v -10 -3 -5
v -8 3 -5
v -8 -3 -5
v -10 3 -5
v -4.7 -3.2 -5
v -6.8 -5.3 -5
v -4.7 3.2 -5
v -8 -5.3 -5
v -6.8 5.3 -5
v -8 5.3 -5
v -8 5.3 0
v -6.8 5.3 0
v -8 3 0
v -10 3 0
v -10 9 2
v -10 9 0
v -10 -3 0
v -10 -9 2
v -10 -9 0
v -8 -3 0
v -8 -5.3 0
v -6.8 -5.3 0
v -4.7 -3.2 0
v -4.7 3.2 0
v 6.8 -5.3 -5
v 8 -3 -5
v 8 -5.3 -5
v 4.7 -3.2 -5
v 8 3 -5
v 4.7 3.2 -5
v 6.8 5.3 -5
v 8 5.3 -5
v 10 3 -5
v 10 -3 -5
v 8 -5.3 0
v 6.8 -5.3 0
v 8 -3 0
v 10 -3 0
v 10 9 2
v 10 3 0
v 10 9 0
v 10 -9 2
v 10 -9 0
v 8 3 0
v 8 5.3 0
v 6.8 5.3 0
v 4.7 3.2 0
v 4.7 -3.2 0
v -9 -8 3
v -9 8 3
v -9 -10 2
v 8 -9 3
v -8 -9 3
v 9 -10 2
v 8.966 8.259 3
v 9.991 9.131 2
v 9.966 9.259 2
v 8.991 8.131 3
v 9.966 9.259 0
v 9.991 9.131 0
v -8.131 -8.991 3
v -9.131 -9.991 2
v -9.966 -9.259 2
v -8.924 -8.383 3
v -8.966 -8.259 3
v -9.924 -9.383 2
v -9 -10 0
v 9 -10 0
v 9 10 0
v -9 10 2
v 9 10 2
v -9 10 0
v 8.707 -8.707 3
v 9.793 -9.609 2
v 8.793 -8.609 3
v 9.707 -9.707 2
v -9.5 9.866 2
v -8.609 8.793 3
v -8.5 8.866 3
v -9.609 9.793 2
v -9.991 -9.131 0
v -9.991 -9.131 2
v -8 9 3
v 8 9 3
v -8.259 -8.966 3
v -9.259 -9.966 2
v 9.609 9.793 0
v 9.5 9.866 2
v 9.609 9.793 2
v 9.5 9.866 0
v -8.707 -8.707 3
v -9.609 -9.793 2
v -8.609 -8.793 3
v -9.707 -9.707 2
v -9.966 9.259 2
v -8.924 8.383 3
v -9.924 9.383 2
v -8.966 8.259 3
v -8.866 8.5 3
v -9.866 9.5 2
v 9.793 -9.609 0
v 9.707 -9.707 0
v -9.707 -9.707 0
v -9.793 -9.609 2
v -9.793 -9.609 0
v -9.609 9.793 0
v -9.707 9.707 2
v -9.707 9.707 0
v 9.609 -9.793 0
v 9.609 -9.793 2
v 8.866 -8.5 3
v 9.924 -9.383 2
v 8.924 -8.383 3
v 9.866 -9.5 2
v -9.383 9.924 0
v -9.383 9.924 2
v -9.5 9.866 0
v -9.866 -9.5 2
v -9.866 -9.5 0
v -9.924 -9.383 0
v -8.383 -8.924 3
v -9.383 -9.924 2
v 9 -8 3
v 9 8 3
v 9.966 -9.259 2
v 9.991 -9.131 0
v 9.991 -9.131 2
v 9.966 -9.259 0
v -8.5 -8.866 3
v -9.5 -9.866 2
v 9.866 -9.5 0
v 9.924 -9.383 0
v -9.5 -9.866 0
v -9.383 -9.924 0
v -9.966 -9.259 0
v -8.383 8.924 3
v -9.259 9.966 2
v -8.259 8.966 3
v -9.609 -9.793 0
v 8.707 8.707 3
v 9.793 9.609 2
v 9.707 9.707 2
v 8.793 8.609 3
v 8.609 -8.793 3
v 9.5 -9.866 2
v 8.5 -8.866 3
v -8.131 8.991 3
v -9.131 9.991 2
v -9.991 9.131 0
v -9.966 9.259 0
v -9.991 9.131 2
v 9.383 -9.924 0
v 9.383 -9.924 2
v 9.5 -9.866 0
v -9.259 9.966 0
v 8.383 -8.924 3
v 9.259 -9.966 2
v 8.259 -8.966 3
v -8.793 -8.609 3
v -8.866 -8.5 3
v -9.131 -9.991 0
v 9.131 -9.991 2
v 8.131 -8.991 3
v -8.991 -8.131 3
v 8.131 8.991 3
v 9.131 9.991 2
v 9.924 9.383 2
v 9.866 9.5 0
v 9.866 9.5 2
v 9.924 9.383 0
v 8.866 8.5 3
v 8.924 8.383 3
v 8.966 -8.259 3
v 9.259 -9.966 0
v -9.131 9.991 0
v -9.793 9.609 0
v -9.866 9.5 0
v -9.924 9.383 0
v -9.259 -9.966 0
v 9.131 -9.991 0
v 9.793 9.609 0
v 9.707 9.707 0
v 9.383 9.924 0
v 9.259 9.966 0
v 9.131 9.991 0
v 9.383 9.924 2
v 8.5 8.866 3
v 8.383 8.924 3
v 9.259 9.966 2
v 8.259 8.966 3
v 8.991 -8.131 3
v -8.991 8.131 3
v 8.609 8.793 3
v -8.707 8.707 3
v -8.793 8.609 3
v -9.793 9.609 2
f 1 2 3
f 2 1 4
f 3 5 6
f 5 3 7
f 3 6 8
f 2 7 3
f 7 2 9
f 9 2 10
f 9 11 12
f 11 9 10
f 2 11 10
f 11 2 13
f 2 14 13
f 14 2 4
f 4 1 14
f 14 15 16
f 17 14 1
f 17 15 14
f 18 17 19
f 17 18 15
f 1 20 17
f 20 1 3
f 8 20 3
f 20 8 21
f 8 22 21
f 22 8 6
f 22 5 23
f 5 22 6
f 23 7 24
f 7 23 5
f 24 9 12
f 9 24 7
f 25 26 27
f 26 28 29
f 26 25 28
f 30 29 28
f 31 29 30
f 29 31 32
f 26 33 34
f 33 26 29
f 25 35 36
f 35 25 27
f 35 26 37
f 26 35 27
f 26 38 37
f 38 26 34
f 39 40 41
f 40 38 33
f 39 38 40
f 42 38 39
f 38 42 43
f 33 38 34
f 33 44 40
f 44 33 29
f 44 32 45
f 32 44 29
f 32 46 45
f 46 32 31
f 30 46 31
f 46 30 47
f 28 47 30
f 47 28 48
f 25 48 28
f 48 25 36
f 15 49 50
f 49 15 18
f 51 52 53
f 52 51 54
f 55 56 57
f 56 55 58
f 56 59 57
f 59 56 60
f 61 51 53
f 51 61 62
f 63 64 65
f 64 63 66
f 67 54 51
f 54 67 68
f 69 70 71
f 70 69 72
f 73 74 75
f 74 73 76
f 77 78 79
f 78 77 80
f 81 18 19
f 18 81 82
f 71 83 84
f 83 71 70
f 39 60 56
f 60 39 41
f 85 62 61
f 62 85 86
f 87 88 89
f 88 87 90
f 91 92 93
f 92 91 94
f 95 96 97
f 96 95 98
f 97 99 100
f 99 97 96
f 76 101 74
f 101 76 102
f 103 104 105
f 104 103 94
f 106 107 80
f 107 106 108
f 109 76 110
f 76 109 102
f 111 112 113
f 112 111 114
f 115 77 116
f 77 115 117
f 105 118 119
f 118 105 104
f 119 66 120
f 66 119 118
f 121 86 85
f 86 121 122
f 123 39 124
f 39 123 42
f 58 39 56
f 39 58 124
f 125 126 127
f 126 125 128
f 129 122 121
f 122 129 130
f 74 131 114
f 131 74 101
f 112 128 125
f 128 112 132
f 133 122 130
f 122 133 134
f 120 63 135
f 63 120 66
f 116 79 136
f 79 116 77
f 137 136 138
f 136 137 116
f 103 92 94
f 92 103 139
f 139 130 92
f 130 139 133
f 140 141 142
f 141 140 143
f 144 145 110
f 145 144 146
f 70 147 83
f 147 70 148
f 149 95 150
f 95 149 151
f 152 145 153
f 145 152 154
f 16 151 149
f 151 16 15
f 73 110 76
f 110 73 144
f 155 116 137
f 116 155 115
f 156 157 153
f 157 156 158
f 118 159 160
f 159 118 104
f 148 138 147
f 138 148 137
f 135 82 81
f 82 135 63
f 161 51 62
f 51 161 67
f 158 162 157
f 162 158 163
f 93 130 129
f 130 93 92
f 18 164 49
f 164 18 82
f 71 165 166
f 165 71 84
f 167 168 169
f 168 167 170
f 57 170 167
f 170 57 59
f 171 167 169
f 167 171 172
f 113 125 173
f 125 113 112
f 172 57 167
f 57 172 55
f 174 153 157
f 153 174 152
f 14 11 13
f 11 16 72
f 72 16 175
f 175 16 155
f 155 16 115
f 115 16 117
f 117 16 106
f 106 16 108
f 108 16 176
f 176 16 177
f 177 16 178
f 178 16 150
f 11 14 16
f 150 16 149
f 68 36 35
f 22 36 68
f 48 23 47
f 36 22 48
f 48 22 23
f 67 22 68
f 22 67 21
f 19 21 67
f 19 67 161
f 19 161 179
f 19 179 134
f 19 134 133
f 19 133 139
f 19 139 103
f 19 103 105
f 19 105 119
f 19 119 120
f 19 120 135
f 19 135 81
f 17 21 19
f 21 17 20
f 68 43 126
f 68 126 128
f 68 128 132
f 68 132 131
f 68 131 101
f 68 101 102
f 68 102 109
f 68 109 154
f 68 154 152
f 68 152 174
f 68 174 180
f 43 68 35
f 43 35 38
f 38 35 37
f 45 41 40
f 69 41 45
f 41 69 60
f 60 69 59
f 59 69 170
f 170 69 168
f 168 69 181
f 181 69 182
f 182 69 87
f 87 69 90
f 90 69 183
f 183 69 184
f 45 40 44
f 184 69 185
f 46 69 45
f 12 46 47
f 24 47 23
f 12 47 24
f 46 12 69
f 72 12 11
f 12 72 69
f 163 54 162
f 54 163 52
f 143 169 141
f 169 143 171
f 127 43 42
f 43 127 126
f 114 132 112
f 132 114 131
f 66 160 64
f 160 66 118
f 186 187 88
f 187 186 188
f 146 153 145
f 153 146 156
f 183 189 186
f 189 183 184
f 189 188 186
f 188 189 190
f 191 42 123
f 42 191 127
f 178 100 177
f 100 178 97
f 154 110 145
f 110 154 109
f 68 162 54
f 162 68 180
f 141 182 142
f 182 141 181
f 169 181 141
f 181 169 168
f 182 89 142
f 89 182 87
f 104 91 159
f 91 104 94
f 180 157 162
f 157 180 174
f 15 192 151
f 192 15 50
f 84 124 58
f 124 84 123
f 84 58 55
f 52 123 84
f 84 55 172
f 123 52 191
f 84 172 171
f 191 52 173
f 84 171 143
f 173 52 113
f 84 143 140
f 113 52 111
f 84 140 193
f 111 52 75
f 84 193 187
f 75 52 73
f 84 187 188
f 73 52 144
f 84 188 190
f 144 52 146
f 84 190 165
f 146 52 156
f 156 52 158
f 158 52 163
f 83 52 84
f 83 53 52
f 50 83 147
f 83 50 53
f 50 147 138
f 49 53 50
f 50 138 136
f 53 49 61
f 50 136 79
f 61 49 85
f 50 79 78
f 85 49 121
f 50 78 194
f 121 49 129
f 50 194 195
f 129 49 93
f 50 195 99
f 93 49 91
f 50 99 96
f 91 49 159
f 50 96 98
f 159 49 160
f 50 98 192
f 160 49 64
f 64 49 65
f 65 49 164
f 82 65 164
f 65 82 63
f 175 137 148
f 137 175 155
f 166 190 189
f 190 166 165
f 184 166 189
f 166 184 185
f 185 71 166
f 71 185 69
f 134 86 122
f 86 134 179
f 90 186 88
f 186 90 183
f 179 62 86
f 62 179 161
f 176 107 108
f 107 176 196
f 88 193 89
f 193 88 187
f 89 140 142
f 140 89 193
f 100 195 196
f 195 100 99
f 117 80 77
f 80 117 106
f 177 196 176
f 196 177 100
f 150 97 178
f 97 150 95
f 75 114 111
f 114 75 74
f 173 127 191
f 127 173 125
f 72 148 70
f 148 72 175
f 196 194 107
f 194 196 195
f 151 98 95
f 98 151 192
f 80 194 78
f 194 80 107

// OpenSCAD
// file: spine-cap.scad
// Spine cap, v3: a square 20 x 20 block that plugs into the top of the
// vertical 2020 and carries the balance line over it in a 45 degree V groove.
// The line comes up the spine's front slot from the carriage, crosses the top,
// and drops THROUGH the cap into the rear slot's channel, so it runs down
// inside the channel to the load stack's T slider (load-stack.scad). No
// guide line anchors any more: Matt tried guide lines on the rig, 2026-09-19,
// and gave them up for the rail's own channel.
//
// Press fit from the rail's own geometry: a tee tab into each SIDE slot,
// stem a touch wider than the slot opening, head a diamond under the lips
// with every face at 45 degrees or vertical. No centre peg. The front and
// rear slots are left open.
//
// Cut for plain T-slot 2020, not V-slot: a 6 mm straight opening, lips about
// 1.8 thick, an 11 mm channel. Measure the rail: slot_w is what the fit
// rides on, and generic extrusion runs 6.0 to 6.3.
//
// The top's front edge is chamfered 45 degrees and the V groove follows the
// chamfer down to the face, so the line bends twice by 45 on its way down to
// the carriage. At the rear the groove runs level to drop_y, where a thin slit
// goes down through the cap into the channel and out through the rear face,
// so the line is laid in with the cap on and sits at the slit's front end.
//
// Printed upside down (print_flip = true, which the STL is): the top face is
// on the bed, the V groove is a 45 degree cavity, the chamfer a 45 degree
// overhang, the tabs stand up. No support.
//
// Friction: a groove is a capstan and the line wraps 180 degrees. At 10 N
// hanging and mu ~0.15 on smooth PLA that is about 3.8 N to raise the arm
// and 6 N to lower it. Keep the groove smooth; a pulley is the fallback.
rail        = 20;
// Plain T-slot 2020. Measure yours.
slot_w      = 6.0;     // opening at the face
lip_t       = 1.8;     // face to the underside of the lip
chan_w      = 11;      // channel width just under the lips
chan_str    = 1.6;     // how far below the lips the channel stays full width, before it angles in at 45
chan_d      = 5.5;     // face to the deepest the tab may go
cap_h       = 5;       // above the rail's end
groove_w    = 3;       // at the surface; 45 degree walls, so 1.5 deep
edge_c      = 1.5;     // chamfer on the front top edge; the groove follows it, so at least groove_d
side_c      = 1.5;     // chamfer on the rear and side top edges, the same
tab_len     = 5;       // into the rail
tab_fit     = 0.0;     // a side, in the opening: 0.1 sheared on the first print, printed stems run fat anyway
tab_clr     = 0.2;     // a side, everywhere else
drop_y      = 8.0;     // the slit's front end: the line drops here into the channel, at load-stack.scad's line_y
drop_slit   = 1.2;     // a thin slit from there out through the rear face
print_flip  = false;   // top face down, tabs up
show_context = false;  // rail stub and the two line runs; preview only
$fn = 48;

half       = rail/2;
groove_d   = groove_w/2;
// Tab, distances from the rail centre: stem through the opening to just under
// the lip, then a head full width for the channel's straight part, then 45
// degrees in to the bottom: the shape of a 2020 channel. The first cut was a
// diamond widest 4 mm down, where the channel has already narrowed, and it
// sheared going in.
stem_h     = slot_w/2 + tab_fit;
stem_top   = half - lip_t - tab_clr;          // underside of the lip
head_h     = chan_w/2 - tab_clr;              // full width
head_y     = half - lip_t - chan_str + tab_clr;   // down to where the channel angles in
bottom_y   = half - chan_d + tab_clr;         // deepest point
bottom_h   = head_h - (head_y - bottom_y);    // half width there

assert(groove_d < cap_h - 1, "groove through the cap");
assert(edge_c >= groove_d, "chamfer shallower than the groove");
assert(bottom_h > 1.5, "tab bottom too narrow: raise chan_d or chan_str");
assert(head_y > bottom_y, "channel too shallow for the head");
echo(str("cap ", cap_h, " high; tab stem ", 2*stem_h, " wide, head ", 2*head_h,
         " wide from ", half - stem_top, " to ", half - head_y, " below the face, then 45 in to ",
         2*bottom_h, " wide at ", half - bottom_y));

module tab_2d() {   // for the +Y slot, y outward; rotated to the side slots
    polygon([
        [-stem_h, half], [-stem_h, stem_top], [-head_h, stem_top], [-head_h, head_y],
        [-bottom_h, bottom_y], [ bottom_h, bottom_y],
        [ head_h, head_y], [ head_h, stem_top], [ stem_h, stem_top], [ stem_h, half]
    ]);
}
module tabs() {
    for(a=[90, -90]) rotate([0,0,a]) translate([0,0,-tab_len]) linear_extrude(tab_len + 0.01) tab_2d();
}

// Body: YZ profile with the two chamfers, extruded across X.
module body_2d() {   // YZ: front chamfer edge_c, rear chamfer side_c
    polygon([[-half, 0], [half, 0], [half, cap_h - side_c], [half - side_c, cap_h],
             [-half + edge_c, cap_h], [-half, cap_h - edge_c]]);
}
module sides_2d() {  // XZ: side chamfers
    polygon([[-half, 0], [half, 0], [half, cap_h - side_c], [half - side_c, cap_h],
             [-half + side_c, cap_h], [-half, cap_h - side_c]]);
}
module yz(w) { rotate([90,0,90]) linear_extrude(w, center=true) children(); }

// V cutter cross-section: apex groove_d below the surface, flared above it.
module vee_2d() {
    polygon([[-groove_w/2 - 1, 1], [-groove_w/2, 0], [0, -groove_d], [groove_w/2, 0], [groove_w/2 + 1, 1]]);
}
// The V section at a point on the path, tilted about X by `tilt` so it stays
// square to the surface (0 on the top, -45 down the rear chamfer).
module vee_at(y, z, tilt) {
    translate([0, y, z]) rotate([tilt, 0, 0]) rotate([90,0,0]) linear_extrude(0.02, center=true) vee_2d();
}
module groove() {
    yt = half - edge_c;   // front chamfer starts
    e  = 1.5;             // run past the face
    hull() { vee_at(-yt, cap_h, 22.5); vee_at(half + e, cap_h, 0); }
    hull() { vee_at(-yt, cap_h, 22.5); vee_at(-half - e, cap_h - edge_c - e, 45); }
}

assert(drop_y + drop_slit/2 < half, "drop slit starts outside the rear face");
assert(groove_d >= side_c, "rear chamfer reaches down to the drop hole mouth");
module drop() {
    hull() for(y=[drop_y, half + 1]) translate([0, y, -1]) cylinder(h=cap_h + 2, d=drop_slit, $fn=16);
    // eased front end, where the line turns down out of the groove
    translate([0, drop_y, cap_h - groove_d - 1]) cylinder(h=1.01, d1=drop_slit, d2=drop_slit + 2, $fn=16);
}
module spine_cap() {
    difference() {
        union() {
            intersection() { yz(rail) body_2d(); rotate([90,0,0]) linear_extrude(rail + 2, center=true) sides_2d(); }
            tabs();
        }
        groove();
        drop();
    }
}

if(print_flip) translate([0,0,cap_h]) rotate([180,0,0]) spine_cap();
else spine_cap();

if(show_context && !print_flip) %union() {
    translate([0,0,-60]) color([0.66,0.71,0.75]) linear_extrude(60) difference() {
        square(rail, center=true);
        for(a=[0:90:270]) rotate(a) {
            translate([-slot_w/2, half - lip_t]) square([slot_w, lip_t + 1]);
            translate([-chan_w/2, half - chan_d]) square([chan_w, chan_d - lip_t]);
        }
    }
    color([0.1,0.7,0.9]) for(y=[-half, half])
        translate([0, y, -60]) cylinder(h=60 + cap_h - edge_c, d=0.6, $fn=8);
}
// main file
// Arm end cap: a plain 20 x 20 lid for each end of the gantry 2020 (Matt,
// 2026-09-27). It carries nothing; it covers the cut end and its edges.
//
// The press fit is the spine cap's, by `use`, unchanged: a tee tab into two
// opposite slots, stem at the slot opening, head under the lips
// (spine-cap.scad, tabs()). That fit is proven on this V-slot. The cap is
// square, so it goes on with the tabs in either pair of slots; the side
// slots keep them out of the wheels' tracks.
//
// It stays inside the rail's 20 x 20, so it is not a travel stop: the wheels
// roll straight past it and off the end.
//
// Printed upside down (print_flip = true, which the STL is): the top face on
// the bed, the chamfer a 45 degree overhang, the tabs standing. No support.
// Print two.
use <spine-cap.scad>
rail        = 20;
cap_h       = 3;       // above the rail's end
edge_c      = 1;       // chamfer on the four top edges
corner_r    = 1;       // the four upright corners
print_flip  = false;   // top face down, tabs up
show_context = false;  // rail stub; preview only
$fn = 48;

assert(edge_c < cap_h, "chamfer taller than the cap");
assert(edge_c < rail/2 - corner_r, "chamfer leaves no top face");
echo(str("end cap ", rail, " x ", rail, " x ", cap_h, ", tabs from spine-cap.scad"));

module plan(d=0) { offset(r=corner_r) square(rail - 2*corner_r - 2*d, center=true); }

module arm_end_cap() {
    hull() {
        linear_extrude(cap_h - edge_c) plan();
        translate([0,0,cap_h - 0.01]) linear_extrude(0.01) plan(edge_c);
    }
    tabs();
}

if(print_flip) translate([0,0,cap_h]) rotate([180,0,0]) arm_end_cap();
else arm_end_cap();

if(show_context && !print_flip) %translate([0,0,-40]) color([0.66,0.71,0.75])
    linear_extrude(40) difference() {
        square(rail, center=true);
        for(a=[0:90:270]) rotate(a) {
            translate([-3, rail/2 - 1.8]) square([6, 3]);
            translate([-5.5, rail/2 - 5.5]) square([11, 3.7]);
        }
    }
